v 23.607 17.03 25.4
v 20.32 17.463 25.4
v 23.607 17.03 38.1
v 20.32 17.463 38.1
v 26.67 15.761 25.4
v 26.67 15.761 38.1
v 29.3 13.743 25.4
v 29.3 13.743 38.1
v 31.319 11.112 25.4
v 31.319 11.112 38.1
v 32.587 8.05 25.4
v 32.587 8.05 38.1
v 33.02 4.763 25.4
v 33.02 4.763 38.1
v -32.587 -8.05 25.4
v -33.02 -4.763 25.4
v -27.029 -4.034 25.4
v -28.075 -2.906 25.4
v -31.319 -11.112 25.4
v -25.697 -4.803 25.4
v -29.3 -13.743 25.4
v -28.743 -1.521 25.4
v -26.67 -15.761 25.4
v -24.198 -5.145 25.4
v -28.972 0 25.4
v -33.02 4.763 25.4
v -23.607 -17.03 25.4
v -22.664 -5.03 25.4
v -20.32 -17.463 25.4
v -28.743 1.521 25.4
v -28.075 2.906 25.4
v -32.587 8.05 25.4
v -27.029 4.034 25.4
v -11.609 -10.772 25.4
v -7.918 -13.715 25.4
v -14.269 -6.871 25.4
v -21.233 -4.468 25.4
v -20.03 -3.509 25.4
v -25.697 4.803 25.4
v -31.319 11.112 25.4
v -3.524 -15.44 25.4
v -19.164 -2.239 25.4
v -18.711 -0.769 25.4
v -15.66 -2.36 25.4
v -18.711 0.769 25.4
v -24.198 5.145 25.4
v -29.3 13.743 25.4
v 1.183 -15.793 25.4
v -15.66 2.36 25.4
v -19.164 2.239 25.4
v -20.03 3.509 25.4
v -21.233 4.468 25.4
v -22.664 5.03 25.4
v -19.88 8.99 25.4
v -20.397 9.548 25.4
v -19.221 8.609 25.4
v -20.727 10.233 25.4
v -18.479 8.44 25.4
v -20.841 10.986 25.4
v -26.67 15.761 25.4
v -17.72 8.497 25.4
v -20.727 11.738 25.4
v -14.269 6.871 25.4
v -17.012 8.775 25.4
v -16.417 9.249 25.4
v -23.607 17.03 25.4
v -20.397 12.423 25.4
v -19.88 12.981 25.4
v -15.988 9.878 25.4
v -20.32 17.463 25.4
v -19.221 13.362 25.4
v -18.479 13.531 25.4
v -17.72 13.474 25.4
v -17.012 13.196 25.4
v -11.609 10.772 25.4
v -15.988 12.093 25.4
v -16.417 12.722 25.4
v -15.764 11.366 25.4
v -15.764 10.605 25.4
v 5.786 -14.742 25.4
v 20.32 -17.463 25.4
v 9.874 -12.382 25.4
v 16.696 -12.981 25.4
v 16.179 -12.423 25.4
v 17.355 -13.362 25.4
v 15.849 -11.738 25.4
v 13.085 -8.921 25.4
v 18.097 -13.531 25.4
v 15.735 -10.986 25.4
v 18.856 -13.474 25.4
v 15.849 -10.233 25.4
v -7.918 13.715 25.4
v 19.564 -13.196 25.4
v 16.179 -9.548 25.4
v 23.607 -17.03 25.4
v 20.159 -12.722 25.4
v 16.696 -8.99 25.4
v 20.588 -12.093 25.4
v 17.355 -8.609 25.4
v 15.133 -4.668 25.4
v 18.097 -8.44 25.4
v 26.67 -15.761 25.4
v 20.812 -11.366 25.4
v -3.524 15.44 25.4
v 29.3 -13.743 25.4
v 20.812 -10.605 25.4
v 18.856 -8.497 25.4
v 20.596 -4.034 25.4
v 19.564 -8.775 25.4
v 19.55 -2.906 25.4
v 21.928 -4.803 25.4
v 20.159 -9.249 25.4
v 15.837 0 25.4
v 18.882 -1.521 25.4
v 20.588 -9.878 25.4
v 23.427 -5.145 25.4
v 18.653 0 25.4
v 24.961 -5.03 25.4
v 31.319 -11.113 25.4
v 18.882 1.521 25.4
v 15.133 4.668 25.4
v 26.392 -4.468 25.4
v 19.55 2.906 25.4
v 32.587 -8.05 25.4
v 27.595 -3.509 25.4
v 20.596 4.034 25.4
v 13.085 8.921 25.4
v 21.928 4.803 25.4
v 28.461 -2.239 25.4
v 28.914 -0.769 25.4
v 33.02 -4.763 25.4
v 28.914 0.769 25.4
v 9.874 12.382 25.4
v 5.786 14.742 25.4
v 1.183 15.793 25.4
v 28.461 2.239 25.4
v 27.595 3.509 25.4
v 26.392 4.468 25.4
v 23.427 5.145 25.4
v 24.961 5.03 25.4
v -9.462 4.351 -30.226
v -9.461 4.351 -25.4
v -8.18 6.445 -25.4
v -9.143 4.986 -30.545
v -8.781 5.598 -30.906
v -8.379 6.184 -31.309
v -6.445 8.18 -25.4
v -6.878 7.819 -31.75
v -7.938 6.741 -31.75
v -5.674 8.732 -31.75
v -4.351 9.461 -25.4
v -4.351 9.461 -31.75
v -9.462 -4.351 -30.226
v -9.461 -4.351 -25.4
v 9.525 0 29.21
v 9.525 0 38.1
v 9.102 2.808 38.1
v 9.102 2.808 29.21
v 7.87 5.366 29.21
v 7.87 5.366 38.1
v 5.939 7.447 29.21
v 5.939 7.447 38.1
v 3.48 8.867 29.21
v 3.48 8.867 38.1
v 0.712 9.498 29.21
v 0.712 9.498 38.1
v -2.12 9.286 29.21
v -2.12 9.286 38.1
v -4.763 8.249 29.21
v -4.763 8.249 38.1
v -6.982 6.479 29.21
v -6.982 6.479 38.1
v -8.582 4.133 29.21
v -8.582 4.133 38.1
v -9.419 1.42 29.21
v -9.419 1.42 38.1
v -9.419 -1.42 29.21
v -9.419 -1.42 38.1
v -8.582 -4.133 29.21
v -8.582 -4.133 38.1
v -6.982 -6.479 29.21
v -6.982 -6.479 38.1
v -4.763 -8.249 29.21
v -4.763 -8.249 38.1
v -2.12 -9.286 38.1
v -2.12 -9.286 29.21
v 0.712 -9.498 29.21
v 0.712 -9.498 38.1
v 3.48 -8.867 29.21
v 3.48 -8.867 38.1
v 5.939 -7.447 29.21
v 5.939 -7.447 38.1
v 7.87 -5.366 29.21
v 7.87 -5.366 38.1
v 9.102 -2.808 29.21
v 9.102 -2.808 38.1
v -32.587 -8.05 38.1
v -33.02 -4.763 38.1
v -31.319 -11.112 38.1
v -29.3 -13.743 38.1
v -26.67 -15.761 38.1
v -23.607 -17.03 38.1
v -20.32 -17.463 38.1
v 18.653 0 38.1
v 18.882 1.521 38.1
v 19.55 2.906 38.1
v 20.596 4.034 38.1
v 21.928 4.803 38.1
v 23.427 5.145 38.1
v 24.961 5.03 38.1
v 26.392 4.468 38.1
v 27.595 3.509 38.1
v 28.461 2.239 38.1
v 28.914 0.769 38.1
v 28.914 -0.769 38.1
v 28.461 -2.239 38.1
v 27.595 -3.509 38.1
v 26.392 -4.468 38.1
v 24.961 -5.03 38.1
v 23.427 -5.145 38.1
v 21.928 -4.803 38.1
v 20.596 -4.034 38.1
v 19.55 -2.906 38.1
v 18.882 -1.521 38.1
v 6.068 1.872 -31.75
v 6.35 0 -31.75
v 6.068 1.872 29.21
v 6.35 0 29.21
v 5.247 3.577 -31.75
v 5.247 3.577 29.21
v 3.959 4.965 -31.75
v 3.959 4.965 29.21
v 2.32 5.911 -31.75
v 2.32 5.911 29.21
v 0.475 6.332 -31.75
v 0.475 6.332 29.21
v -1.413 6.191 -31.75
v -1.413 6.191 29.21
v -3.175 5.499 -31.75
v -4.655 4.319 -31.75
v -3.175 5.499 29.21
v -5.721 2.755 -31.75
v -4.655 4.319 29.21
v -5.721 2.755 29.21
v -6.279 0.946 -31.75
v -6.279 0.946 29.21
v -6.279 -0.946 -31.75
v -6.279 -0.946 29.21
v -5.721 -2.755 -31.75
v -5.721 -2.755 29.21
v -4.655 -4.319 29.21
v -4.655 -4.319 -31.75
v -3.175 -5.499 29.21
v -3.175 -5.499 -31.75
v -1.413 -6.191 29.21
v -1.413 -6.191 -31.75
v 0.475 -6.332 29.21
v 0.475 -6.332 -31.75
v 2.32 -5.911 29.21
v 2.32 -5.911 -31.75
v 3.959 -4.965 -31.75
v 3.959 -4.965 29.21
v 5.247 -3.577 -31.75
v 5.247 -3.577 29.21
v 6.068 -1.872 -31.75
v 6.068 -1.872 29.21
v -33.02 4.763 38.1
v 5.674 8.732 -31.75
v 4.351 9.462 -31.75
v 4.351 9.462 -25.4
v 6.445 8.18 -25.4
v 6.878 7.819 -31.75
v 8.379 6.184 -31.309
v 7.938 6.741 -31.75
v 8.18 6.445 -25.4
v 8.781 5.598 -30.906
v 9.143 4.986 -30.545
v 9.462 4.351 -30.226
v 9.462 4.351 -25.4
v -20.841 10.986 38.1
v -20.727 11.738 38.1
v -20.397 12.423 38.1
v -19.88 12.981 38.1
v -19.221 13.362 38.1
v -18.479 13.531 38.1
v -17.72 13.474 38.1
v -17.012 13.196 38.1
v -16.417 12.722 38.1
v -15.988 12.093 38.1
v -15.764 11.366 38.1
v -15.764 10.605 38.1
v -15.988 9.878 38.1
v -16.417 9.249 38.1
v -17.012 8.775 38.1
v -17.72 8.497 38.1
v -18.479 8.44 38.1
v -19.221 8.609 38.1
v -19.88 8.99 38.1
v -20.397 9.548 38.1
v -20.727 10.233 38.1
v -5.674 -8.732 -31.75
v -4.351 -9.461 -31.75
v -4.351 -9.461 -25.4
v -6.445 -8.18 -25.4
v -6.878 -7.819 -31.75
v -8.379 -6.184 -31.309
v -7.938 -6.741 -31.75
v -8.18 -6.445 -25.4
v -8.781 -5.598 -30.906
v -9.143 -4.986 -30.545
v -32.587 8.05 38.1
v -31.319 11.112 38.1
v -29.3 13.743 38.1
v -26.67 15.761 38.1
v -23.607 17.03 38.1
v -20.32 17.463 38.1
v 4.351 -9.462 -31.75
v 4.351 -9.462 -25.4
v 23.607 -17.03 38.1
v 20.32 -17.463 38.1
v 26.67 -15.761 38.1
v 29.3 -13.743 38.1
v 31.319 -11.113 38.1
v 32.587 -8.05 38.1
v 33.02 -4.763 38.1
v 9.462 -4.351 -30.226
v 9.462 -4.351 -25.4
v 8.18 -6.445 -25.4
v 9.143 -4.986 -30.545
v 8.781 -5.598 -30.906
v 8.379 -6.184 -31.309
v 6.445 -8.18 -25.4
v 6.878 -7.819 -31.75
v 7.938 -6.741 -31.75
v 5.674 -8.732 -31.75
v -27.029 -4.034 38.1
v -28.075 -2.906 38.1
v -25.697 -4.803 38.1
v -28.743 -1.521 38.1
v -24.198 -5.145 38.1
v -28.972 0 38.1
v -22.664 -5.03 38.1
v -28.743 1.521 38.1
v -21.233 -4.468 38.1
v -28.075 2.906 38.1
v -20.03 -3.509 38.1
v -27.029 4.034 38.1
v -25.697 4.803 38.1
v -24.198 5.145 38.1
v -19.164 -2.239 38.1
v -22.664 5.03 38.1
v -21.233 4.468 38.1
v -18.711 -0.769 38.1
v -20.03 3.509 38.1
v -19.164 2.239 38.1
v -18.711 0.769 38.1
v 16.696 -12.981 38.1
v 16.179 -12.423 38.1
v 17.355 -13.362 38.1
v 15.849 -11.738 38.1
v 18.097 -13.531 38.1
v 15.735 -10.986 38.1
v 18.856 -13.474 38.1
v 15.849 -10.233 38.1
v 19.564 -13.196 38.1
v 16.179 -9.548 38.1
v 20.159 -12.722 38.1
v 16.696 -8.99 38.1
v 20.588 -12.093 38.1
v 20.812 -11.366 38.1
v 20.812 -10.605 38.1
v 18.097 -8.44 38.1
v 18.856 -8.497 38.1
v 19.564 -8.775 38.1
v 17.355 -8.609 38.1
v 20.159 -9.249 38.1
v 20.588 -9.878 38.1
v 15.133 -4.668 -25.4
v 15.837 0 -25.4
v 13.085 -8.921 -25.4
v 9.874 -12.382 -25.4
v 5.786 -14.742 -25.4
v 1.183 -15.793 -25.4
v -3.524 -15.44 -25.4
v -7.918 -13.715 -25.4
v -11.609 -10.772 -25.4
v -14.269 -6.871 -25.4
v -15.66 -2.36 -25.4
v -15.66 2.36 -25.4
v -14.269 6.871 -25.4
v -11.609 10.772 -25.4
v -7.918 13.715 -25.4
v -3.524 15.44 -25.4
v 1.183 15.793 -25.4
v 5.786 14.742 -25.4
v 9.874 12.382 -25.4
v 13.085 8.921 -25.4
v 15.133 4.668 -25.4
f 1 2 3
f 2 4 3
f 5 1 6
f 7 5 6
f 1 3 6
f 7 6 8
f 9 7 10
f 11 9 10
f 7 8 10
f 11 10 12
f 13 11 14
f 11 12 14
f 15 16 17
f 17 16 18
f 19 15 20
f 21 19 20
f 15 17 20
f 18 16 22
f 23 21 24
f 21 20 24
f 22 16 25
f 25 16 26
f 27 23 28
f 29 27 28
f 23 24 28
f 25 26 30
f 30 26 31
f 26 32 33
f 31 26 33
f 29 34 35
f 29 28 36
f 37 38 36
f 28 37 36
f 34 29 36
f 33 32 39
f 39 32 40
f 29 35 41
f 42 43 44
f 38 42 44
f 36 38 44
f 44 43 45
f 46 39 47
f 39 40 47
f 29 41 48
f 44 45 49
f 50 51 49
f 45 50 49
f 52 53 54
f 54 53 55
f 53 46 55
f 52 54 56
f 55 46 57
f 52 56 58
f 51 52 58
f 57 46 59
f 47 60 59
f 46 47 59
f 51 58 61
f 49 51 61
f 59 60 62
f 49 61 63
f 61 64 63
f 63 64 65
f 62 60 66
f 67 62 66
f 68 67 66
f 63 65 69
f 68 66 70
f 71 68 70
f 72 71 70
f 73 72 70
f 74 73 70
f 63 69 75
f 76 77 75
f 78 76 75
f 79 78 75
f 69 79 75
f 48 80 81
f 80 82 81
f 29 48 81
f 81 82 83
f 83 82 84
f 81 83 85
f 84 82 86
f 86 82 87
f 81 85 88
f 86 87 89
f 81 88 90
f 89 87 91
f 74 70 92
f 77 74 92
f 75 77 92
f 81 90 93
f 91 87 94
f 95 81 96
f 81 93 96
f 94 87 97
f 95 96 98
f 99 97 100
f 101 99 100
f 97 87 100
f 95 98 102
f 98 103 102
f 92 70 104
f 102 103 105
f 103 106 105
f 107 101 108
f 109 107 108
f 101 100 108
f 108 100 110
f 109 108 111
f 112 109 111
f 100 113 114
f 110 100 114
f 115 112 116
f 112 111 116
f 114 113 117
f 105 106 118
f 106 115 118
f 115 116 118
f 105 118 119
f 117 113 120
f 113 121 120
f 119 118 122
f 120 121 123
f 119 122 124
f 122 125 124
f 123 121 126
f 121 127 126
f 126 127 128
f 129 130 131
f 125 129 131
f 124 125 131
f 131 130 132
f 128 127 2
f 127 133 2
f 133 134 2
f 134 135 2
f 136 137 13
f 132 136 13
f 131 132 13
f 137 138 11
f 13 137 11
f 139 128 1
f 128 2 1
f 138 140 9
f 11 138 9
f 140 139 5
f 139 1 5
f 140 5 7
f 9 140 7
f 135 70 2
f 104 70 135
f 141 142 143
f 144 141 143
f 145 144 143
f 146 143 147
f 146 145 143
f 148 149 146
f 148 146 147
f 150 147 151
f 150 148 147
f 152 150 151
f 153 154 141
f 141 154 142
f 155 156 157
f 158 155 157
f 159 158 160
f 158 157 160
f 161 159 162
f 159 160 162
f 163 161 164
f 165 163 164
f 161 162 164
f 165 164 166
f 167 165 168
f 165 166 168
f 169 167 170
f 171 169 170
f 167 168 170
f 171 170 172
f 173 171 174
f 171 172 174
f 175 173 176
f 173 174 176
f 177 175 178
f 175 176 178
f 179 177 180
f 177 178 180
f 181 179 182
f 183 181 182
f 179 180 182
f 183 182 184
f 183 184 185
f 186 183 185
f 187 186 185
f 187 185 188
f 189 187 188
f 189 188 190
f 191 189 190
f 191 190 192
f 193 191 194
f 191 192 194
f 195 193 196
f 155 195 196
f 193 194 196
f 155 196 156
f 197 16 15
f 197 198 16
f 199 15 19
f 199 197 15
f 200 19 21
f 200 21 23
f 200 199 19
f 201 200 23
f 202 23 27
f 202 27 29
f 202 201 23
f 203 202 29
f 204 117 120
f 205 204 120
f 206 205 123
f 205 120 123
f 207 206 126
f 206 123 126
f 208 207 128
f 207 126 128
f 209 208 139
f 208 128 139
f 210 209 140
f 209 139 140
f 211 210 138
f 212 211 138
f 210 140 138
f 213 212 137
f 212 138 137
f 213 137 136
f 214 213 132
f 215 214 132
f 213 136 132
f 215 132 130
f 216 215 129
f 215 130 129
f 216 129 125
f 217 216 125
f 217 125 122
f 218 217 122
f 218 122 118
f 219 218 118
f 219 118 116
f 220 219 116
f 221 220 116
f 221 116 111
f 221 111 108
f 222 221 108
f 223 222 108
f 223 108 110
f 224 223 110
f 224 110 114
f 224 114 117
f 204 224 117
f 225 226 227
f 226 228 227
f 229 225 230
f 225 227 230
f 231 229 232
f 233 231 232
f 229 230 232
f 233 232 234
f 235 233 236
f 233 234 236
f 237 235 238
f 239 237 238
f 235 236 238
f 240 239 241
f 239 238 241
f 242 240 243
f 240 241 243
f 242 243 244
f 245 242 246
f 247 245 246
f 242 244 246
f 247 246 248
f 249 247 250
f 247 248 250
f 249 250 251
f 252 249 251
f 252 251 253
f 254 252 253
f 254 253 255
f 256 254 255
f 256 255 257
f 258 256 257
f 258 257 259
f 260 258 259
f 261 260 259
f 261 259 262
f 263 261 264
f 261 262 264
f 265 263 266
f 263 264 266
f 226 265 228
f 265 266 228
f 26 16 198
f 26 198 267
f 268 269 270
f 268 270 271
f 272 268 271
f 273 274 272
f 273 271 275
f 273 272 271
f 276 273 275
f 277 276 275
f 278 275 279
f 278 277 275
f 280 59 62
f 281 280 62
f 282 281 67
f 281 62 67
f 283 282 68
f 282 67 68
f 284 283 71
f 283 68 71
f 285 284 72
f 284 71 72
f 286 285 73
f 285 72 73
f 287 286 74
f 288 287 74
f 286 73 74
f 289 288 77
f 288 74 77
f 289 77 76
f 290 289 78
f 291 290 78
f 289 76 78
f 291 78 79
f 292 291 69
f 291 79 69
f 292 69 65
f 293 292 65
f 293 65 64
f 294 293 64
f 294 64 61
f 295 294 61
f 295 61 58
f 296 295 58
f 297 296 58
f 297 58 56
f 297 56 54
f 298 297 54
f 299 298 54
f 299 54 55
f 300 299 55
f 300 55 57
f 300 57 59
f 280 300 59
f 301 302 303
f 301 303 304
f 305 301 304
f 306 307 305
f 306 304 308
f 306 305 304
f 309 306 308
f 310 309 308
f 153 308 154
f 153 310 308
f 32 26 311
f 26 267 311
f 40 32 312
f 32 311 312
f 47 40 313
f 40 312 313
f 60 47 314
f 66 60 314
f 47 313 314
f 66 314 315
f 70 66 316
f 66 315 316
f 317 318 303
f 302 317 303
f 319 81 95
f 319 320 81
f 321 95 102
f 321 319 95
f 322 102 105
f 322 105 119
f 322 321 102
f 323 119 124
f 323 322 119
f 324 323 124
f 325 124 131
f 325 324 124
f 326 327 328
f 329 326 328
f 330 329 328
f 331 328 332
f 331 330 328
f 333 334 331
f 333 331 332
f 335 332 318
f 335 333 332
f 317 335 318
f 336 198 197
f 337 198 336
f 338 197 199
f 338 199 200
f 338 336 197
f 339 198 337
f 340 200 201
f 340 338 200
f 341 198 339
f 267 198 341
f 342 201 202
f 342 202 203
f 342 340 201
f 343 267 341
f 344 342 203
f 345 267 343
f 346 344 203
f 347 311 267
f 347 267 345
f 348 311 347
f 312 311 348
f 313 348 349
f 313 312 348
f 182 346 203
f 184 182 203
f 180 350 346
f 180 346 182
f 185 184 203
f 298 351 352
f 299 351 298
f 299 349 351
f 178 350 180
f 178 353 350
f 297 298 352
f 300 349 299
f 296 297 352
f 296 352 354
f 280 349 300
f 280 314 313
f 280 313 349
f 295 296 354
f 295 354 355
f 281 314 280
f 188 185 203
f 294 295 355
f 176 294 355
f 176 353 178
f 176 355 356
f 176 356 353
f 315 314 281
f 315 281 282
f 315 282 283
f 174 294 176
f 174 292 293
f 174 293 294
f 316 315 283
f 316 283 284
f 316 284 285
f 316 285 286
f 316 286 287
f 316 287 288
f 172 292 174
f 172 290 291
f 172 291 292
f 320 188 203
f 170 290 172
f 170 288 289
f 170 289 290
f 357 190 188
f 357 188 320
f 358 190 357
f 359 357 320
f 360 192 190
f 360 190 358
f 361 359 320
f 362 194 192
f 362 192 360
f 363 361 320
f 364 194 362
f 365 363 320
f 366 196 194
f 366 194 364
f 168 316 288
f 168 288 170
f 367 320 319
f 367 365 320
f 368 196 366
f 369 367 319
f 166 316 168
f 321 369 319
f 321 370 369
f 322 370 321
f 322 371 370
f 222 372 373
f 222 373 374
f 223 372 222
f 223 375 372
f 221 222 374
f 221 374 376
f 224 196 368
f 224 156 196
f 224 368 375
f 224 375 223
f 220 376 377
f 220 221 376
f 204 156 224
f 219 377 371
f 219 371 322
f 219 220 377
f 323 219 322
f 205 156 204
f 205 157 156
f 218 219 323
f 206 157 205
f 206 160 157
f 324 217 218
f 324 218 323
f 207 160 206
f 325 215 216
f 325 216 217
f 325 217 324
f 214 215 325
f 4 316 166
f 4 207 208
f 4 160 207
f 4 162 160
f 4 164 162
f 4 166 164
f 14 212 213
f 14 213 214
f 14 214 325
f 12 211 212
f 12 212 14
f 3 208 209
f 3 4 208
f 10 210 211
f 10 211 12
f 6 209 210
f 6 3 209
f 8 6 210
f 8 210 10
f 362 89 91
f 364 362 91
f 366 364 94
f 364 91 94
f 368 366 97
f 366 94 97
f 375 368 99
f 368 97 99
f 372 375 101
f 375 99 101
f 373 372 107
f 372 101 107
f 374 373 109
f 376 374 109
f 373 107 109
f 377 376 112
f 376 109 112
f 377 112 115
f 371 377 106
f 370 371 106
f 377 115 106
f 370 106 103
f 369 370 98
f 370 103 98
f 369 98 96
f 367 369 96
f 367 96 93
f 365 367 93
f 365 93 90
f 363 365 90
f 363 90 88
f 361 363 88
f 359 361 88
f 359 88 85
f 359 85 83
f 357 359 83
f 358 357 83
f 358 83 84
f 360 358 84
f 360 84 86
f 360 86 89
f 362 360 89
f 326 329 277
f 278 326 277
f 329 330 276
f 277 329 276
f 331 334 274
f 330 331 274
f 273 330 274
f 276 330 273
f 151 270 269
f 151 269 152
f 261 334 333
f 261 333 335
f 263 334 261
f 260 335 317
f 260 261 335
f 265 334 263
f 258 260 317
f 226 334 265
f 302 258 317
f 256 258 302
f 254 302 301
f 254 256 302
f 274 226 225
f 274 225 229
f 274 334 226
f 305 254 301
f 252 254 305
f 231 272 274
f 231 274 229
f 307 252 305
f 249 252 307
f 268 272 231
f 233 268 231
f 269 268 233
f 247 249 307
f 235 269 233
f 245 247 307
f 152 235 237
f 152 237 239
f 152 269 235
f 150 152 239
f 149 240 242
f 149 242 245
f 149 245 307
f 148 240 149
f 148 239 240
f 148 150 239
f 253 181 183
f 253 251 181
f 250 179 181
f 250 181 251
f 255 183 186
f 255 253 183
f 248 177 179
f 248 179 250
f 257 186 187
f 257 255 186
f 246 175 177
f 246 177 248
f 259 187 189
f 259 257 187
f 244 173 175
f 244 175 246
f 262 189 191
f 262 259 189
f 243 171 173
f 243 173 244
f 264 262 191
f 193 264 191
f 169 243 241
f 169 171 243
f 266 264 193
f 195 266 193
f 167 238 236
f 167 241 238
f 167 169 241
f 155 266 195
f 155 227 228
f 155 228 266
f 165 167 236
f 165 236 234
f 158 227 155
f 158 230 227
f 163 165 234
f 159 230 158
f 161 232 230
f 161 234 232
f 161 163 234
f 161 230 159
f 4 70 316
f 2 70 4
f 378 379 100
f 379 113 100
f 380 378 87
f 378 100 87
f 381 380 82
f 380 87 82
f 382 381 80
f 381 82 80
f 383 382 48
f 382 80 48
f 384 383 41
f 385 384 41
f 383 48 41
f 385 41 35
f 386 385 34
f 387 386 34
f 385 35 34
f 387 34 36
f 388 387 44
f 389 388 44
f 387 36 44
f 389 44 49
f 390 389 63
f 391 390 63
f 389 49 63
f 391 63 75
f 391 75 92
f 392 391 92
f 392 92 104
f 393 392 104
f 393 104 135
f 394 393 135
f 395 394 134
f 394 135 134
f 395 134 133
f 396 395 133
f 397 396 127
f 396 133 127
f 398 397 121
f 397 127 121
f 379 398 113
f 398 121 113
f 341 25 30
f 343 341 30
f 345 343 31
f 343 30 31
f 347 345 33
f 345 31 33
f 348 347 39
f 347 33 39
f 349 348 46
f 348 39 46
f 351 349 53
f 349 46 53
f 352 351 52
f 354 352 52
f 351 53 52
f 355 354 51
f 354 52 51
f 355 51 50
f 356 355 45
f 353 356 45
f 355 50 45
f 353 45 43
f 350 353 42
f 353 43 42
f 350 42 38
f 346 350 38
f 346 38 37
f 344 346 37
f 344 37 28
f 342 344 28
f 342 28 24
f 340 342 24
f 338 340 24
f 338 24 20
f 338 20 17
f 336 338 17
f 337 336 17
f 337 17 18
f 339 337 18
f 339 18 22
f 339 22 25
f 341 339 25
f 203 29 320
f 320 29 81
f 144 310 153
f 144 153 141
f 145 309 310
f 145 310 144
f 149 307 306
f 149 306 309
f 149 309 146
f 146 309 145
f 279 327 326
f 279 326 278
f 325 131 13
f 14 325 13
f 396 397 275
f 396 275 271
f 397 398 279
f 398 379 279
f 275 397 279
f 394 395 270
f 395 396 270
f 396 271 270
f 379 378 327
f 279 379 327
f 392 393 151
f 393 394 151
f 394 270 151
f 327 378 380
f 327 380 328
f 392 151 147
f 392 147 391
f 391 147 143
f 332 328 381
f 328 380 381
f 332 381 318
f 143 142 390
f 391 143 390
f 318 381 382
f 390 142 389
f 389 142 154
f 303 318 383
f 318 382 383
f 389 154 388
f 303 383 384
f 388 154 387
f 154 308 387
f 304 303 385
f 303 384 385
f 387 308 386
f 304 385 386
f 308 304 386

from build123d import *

# Parameters (mm, degrees)
SKETCH1_R                        = 15.8369
EXTRUDE1_DEPTH                   = 25.4
SKETCH2_W                        = 66.04
SKETCH2_H                        = 34.925
EXTRUDE2_DEPTH                   = 12.7
SKETCH4_R                        = 6.35
CUT_EXTRUDE1_DEPTH               = 70.85
SKETCH6_R                        = 9.525
CUT_EXTRUDE5_DEPTH               = 8.89
SKETCH7_W                        = 18.923
SKETCH7_H                        = 18.923
SKETCH7_R                        = 6.35
EXTRUDE3_DEPTH                   = 6.35
SKETCH9_OUTSIDE_W                = 88.494
SKETCH9_OUTSIDE_H                = 57.38
SKETCH9_OUTSIDE_R                = 10.414
CUT_EXTRUDE7_DEPTH               = 6.35
FILLET1_R                        = 12.7
F_1_4_20_TAPPED_HOLE1_D          = 5.1054
F_13_32_0_40625_DIAMETER_HOLE1_D = 10.31875
CHAMFER2_SIZE                    = 1.524


with BuildPart() as part:
    # Sketch1 → Extrude1 (new body)
    with BuildSketch(Plane.XY):
        Circle(SKETCH1_R)
    extrude(amount=EXTRUDE1_DEPTH)

    # Sketch2 → Extrude2 (add)
    with BuildSketch(Plane.XY.offset(25.4)):
        Rectangle(SKETCH2_W, SKETCH2_H)
    extrude(amount=EXTRUDE2_DEPTH)

    # Sketch3 → Revolve1 (revolve)
    with BuildSketch(Plane(origin=(0, 0, 0), x_dir=(1, 0, 0), z_dir=(0, 1, 0))):
        Polygon((0, 0), (0, 31.75), (9.4615, 31.75), (9.4615, 25.4), (15.8369, 25.4), (15.8369, 0), align=None)
    revolve(axis=Axis((0, 0, 0), (0, 0, -1)))

    # Sketch4 → Cut-Extrude1 (cut, through all)
    with BuildSketch(Plane.XY.offset(38.1)):
        Circle(SKETCH4_R)
    extrude(amount=-CUT_EXTRUDE1_DEPTH, mode=Mode.SUBTRACT)

    # Sketch6 → Cut-Extrude5 (cut)
    with BuildSketch(Plane.XY.offset(38.1)):
        Circle(SKETCH6_R)
    extrude(amount=-CUT_EXTRUDE5_DEPTH, mode=Mode.SUBTRACT)

    # Sketch7 → Extrude3 (add)
    with BuildSketch(Plane(origin=(0, 0, -25.4), x_dir=(-1, 0, 0), z_dir=(0, 0, -1))):
        Rectangle(SKETCH7_W, SKETCH7_H)
        with Locations(Location((0, 0, 0), (0, 0, 180))):  # turned: the seam where the file's is
            Circle(SKETCH7_R, mode=Mode.SUBTRACT)
    extrude(amount=EXTRUDE3_DEPTH)

    # Sketch9 outside → Cut-Extrude7 (cut)
    with BuildSketch(Plane(origin=(0, 0, -31.75), x_dir=(-1, 0, 0), z_dir=(0, 0, -1))):
        Rectangle(SKETCH9_OUTSIDE_W, SKETCH9_OUTSIDE_H)
        Circle(SKETCH9_OUTSIDE_R, mode=Mode.SUBTRACT)
    extrude(amount=-CUT_EXTRUDE7_DEPTH, mode=Mode.SUBTRACT)

    # Fillet1
    fillet1_edges = [part.edges().sort_by_distance(p)[0] for p in [
        (-33.02, 17.4625, 31.75),
        (-33.02, -17.4625, 31.75),
        (33.02, -17.4625, 31.75),
        (33.02, 17.4625, 31.75),
    ]]
    fillet(fillet1_edges, radius=FILLET1_R)

    # 1/4-20 Tapped Hole1 (through all)
    with Locations(Plane.XY.offset(38.1)):
        with Locations((18.288, -10.9855), (-18.288, 10.9855)):
            Hole(F_1_4_20_TAPPED_HOLE1_D / 2)

    # 13/32 (0.40625) Diameter Hole1 (through all)
    with Locations(Plane.XY.offset(38.1)):
        with Locations((-23.8125, 0), (23.8125, 0)):
            Hole(F_13_32_0_40625_DIAMETER_HOLE1_D / 2)

    # Chamfer2
    chamfer2_edges = [part.edges().sort_by_distance(p)[0] for p in [
        (9.4615, 0, -31.75),
        (-9.4615, 0, -31.75),
    ]]
    chamfer(chamfer2_edges, length=CHAMFER2_SIZE)


solid = part.part
